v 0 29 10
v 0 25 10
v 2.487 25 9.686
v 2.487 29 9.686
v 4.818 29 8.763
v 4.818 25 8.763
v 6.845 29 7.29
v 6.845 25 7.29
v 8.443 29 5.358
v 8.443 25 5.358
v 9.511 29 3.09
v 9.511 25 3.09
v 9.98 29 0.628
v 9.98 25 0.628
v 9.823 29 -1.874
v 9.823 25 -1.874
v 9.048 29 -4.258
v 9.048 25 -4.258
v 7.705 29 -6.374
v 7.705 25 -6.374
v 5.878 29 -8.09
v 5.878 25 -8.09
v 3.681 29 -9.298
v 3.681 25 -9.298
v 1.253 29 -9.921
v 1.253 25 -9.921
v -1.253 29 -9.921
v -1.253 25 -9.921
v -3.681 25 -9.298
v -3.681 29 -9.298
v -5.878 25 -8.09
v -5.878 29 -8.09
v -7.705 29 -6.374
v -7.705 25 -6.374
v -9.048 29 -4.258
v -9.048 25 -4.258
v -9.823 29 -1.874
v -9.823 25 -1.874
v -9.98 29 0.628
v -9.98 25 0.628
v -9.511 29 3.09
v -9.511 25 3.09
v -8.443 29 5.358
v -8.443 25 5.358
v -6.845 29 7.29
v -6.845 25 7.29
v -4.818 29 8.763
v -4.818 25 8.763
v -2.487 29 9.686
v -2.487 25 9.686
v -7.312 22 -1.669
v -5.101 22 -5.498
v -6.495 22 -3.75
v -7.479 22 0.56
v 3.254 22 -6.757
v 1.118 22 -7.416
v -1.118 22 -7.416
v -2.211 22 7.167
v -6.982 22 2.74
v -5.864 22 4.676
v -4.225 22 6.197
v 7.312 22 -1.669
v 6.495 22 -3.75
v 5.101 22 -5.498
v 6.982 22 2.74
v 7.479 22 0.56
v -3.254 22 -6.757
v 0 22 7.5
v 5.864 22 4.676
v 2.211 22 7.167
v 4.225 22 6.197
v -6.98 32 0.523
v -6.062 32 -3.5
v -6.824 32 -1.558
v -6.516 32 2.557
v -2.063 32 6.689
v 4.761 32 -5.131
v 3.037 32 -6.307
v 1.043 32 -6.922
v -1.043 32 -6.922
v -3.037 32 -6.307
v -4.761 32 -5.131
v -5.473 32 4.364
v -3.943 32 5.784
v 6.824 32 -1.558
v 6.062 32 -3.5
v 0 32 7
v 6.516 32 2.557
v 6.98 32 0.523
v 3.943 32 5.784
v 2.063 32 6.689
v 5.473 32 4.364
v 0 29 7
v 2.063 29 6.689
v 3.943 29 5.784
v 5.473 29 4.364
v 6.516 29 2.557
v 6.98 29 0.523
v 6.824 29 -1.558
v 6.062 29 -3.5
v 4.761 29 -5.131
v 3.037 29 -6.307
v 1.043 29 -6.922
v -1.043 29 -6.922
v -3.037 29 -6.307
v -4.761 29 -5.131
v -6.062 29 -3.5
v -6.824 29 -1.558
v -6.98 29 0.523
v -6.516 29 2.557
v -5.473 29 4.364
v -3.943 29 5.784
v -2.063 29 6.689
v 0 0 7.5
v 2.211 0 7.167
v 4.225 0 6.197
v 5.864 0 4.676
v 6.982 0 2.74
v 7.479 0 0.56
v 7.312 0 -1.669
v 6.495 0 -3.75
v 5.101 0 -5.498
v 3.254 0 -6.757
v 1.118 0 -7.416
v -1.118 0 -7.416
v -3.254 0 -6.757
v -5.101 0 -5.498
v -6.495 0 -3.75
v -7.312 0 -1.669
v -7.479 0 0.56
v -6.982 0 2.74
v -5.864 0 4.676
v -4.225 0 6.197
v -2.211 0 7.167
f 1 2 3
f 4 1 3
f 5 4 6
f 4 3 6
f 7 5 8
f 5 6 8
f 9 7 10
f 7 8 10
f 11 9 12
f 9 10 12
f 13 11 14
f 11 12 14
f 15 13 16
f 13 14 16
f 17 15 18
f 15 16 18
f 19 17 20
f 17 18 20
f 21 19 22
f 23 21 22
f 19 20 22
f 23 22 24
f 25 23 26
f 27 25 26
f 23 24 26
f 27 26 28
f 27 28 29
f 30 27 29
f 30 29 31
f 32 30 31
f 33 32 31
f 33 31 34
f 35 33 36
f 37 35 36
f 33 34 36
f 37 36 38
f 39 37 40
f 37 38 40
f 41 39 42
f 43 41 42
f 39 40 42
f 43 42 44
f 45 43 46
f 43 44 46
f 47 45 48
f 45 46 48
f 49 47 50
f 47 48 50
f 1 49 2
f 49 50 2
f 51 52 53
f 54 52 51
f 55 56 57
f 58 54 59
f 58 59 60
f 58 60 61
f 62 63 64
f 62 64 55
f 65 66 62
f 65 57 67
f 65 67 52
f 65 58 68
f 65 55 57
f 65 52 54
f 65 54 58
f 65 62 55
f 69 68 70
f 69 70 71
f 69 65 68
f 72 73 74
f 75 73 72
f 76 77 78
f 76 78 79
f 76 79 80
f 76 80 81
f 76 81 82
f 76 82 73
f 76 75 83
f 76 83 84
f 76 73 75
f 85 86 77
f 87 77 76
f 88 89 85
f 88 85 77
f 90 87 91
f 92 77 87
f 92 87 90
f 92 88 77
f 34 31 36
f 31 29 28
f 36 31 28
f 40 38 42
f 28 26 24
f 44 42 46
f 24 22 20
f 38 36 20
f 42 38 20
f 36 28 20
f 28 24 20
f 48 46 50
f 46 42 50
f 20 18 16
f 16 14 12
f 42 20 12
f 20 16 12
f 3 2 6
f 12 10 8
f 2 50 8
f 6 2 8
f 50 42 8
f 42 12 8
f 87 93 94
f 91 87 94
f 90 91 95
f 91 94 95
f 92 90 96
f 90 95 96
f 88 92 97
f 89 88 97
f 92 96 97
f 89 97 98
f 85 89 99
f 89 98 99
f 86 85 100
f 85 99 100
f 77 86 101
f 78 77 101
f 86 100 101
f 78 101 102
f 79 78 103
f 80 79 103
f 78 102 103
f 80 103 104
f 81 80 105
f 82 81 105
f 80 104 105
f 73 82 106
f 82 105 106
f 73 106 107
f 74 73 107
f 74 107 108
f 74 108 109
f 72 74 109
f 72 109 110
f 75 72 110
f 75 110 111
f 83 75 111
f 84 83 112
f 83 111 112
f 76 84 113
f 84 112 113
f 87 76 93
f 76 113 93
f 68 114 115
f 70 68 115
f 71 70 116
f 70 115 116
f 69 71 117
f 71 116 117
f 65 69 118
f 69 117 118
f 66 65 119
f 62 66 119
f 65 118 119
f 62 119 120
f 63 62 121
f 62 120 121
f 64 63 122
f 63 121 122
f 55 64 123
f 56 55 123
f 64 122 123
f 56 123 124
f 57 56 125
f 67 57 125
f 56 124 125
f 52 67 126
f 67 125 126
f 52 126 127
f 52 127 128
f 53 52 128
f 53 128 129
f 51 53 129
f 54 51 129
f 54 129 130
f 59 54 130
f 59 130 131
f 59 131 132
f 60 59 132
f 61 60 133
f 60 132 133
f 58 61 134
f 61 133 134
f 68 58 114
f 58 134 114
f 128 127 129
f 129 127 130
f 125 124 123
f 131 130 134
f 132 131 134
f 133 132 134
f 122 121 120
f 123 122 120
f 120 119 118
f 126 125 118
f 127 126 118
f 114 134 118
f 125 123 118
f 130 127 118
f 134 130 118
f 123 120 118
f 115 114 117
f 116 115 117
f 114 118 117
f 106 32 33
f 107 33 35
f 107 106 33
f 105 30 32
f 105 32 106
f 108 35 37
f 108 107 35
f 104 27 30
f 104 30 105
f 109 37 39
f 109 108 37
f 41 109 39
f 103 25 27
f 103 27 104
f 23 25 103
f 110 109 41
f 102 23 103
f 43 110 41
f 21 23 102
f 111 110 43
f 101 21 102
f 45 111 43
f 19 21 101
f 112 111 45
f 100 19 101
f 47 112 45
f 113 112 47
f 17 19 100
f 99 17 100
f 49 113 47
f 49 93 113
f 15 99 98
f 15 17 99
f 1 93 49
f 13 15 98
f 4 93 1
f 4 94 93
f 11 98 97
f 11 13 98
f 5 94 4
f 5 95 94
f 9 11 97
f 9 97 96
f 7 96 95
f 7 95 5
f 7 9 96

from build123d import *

# Parameters (mm, degrees)
P01_BEZEL_START = 25
SK_P01_BEZEL_R  = 10
P01_BEZEL_DEPTH = 4
P02_LENS_START  = 29
SK_P02_LENS_R   = 7
P02_LENS_DEPTH  = 3
SK_P03_BODY_R   = 7.5
P03_BODY_DEPTH  = 22


with BuildPart() as part:
    # SK_P01_Bezel → P01_Bezel (new body)
    with BuildSketch(Plane(origin=(0, 0, 0), x_dir=(1, 0, 0), z_dir=(0, 1, 0)).offset(P01_BEZEL_START)):
        with Locations(Location((0, 0, 0), (0, 0, 270))):
            Circle(SK_P01_BEZEL_R)
    extrude(amount=P01_BEZEL_DEPTH)

    # SK_P02_Lens → P02_Lens (add)
    with BuildSketch(Plane(origin=(0, 0, 0), x_dir=(1, 0, 0), z_dir=(0, 1, 0)).offset(P02_LENS_START)):
        with Locations(Location((0, 0, 0), (0, 0, 270))):
            Circle(SK_P02_LENS_R)
    extrude(amount=P02_LENS_DEPTH)


with BuildPart() as body_2:
    # SK_P03_Body → P03_Body (new body)
    with BuildSketch(Plane(origin=(0, 0, 0), x_dir=(1, 0, 0), z_dir=(0, 1, 0))):
        with Locations(Location((0, 0, 0), (0, 0, 270))):
            Circle(SK_P03_BODY_R)
    extrude(amount=P03_BODY_DEPTH)


solid = Compound([part.part, body_2.part])
